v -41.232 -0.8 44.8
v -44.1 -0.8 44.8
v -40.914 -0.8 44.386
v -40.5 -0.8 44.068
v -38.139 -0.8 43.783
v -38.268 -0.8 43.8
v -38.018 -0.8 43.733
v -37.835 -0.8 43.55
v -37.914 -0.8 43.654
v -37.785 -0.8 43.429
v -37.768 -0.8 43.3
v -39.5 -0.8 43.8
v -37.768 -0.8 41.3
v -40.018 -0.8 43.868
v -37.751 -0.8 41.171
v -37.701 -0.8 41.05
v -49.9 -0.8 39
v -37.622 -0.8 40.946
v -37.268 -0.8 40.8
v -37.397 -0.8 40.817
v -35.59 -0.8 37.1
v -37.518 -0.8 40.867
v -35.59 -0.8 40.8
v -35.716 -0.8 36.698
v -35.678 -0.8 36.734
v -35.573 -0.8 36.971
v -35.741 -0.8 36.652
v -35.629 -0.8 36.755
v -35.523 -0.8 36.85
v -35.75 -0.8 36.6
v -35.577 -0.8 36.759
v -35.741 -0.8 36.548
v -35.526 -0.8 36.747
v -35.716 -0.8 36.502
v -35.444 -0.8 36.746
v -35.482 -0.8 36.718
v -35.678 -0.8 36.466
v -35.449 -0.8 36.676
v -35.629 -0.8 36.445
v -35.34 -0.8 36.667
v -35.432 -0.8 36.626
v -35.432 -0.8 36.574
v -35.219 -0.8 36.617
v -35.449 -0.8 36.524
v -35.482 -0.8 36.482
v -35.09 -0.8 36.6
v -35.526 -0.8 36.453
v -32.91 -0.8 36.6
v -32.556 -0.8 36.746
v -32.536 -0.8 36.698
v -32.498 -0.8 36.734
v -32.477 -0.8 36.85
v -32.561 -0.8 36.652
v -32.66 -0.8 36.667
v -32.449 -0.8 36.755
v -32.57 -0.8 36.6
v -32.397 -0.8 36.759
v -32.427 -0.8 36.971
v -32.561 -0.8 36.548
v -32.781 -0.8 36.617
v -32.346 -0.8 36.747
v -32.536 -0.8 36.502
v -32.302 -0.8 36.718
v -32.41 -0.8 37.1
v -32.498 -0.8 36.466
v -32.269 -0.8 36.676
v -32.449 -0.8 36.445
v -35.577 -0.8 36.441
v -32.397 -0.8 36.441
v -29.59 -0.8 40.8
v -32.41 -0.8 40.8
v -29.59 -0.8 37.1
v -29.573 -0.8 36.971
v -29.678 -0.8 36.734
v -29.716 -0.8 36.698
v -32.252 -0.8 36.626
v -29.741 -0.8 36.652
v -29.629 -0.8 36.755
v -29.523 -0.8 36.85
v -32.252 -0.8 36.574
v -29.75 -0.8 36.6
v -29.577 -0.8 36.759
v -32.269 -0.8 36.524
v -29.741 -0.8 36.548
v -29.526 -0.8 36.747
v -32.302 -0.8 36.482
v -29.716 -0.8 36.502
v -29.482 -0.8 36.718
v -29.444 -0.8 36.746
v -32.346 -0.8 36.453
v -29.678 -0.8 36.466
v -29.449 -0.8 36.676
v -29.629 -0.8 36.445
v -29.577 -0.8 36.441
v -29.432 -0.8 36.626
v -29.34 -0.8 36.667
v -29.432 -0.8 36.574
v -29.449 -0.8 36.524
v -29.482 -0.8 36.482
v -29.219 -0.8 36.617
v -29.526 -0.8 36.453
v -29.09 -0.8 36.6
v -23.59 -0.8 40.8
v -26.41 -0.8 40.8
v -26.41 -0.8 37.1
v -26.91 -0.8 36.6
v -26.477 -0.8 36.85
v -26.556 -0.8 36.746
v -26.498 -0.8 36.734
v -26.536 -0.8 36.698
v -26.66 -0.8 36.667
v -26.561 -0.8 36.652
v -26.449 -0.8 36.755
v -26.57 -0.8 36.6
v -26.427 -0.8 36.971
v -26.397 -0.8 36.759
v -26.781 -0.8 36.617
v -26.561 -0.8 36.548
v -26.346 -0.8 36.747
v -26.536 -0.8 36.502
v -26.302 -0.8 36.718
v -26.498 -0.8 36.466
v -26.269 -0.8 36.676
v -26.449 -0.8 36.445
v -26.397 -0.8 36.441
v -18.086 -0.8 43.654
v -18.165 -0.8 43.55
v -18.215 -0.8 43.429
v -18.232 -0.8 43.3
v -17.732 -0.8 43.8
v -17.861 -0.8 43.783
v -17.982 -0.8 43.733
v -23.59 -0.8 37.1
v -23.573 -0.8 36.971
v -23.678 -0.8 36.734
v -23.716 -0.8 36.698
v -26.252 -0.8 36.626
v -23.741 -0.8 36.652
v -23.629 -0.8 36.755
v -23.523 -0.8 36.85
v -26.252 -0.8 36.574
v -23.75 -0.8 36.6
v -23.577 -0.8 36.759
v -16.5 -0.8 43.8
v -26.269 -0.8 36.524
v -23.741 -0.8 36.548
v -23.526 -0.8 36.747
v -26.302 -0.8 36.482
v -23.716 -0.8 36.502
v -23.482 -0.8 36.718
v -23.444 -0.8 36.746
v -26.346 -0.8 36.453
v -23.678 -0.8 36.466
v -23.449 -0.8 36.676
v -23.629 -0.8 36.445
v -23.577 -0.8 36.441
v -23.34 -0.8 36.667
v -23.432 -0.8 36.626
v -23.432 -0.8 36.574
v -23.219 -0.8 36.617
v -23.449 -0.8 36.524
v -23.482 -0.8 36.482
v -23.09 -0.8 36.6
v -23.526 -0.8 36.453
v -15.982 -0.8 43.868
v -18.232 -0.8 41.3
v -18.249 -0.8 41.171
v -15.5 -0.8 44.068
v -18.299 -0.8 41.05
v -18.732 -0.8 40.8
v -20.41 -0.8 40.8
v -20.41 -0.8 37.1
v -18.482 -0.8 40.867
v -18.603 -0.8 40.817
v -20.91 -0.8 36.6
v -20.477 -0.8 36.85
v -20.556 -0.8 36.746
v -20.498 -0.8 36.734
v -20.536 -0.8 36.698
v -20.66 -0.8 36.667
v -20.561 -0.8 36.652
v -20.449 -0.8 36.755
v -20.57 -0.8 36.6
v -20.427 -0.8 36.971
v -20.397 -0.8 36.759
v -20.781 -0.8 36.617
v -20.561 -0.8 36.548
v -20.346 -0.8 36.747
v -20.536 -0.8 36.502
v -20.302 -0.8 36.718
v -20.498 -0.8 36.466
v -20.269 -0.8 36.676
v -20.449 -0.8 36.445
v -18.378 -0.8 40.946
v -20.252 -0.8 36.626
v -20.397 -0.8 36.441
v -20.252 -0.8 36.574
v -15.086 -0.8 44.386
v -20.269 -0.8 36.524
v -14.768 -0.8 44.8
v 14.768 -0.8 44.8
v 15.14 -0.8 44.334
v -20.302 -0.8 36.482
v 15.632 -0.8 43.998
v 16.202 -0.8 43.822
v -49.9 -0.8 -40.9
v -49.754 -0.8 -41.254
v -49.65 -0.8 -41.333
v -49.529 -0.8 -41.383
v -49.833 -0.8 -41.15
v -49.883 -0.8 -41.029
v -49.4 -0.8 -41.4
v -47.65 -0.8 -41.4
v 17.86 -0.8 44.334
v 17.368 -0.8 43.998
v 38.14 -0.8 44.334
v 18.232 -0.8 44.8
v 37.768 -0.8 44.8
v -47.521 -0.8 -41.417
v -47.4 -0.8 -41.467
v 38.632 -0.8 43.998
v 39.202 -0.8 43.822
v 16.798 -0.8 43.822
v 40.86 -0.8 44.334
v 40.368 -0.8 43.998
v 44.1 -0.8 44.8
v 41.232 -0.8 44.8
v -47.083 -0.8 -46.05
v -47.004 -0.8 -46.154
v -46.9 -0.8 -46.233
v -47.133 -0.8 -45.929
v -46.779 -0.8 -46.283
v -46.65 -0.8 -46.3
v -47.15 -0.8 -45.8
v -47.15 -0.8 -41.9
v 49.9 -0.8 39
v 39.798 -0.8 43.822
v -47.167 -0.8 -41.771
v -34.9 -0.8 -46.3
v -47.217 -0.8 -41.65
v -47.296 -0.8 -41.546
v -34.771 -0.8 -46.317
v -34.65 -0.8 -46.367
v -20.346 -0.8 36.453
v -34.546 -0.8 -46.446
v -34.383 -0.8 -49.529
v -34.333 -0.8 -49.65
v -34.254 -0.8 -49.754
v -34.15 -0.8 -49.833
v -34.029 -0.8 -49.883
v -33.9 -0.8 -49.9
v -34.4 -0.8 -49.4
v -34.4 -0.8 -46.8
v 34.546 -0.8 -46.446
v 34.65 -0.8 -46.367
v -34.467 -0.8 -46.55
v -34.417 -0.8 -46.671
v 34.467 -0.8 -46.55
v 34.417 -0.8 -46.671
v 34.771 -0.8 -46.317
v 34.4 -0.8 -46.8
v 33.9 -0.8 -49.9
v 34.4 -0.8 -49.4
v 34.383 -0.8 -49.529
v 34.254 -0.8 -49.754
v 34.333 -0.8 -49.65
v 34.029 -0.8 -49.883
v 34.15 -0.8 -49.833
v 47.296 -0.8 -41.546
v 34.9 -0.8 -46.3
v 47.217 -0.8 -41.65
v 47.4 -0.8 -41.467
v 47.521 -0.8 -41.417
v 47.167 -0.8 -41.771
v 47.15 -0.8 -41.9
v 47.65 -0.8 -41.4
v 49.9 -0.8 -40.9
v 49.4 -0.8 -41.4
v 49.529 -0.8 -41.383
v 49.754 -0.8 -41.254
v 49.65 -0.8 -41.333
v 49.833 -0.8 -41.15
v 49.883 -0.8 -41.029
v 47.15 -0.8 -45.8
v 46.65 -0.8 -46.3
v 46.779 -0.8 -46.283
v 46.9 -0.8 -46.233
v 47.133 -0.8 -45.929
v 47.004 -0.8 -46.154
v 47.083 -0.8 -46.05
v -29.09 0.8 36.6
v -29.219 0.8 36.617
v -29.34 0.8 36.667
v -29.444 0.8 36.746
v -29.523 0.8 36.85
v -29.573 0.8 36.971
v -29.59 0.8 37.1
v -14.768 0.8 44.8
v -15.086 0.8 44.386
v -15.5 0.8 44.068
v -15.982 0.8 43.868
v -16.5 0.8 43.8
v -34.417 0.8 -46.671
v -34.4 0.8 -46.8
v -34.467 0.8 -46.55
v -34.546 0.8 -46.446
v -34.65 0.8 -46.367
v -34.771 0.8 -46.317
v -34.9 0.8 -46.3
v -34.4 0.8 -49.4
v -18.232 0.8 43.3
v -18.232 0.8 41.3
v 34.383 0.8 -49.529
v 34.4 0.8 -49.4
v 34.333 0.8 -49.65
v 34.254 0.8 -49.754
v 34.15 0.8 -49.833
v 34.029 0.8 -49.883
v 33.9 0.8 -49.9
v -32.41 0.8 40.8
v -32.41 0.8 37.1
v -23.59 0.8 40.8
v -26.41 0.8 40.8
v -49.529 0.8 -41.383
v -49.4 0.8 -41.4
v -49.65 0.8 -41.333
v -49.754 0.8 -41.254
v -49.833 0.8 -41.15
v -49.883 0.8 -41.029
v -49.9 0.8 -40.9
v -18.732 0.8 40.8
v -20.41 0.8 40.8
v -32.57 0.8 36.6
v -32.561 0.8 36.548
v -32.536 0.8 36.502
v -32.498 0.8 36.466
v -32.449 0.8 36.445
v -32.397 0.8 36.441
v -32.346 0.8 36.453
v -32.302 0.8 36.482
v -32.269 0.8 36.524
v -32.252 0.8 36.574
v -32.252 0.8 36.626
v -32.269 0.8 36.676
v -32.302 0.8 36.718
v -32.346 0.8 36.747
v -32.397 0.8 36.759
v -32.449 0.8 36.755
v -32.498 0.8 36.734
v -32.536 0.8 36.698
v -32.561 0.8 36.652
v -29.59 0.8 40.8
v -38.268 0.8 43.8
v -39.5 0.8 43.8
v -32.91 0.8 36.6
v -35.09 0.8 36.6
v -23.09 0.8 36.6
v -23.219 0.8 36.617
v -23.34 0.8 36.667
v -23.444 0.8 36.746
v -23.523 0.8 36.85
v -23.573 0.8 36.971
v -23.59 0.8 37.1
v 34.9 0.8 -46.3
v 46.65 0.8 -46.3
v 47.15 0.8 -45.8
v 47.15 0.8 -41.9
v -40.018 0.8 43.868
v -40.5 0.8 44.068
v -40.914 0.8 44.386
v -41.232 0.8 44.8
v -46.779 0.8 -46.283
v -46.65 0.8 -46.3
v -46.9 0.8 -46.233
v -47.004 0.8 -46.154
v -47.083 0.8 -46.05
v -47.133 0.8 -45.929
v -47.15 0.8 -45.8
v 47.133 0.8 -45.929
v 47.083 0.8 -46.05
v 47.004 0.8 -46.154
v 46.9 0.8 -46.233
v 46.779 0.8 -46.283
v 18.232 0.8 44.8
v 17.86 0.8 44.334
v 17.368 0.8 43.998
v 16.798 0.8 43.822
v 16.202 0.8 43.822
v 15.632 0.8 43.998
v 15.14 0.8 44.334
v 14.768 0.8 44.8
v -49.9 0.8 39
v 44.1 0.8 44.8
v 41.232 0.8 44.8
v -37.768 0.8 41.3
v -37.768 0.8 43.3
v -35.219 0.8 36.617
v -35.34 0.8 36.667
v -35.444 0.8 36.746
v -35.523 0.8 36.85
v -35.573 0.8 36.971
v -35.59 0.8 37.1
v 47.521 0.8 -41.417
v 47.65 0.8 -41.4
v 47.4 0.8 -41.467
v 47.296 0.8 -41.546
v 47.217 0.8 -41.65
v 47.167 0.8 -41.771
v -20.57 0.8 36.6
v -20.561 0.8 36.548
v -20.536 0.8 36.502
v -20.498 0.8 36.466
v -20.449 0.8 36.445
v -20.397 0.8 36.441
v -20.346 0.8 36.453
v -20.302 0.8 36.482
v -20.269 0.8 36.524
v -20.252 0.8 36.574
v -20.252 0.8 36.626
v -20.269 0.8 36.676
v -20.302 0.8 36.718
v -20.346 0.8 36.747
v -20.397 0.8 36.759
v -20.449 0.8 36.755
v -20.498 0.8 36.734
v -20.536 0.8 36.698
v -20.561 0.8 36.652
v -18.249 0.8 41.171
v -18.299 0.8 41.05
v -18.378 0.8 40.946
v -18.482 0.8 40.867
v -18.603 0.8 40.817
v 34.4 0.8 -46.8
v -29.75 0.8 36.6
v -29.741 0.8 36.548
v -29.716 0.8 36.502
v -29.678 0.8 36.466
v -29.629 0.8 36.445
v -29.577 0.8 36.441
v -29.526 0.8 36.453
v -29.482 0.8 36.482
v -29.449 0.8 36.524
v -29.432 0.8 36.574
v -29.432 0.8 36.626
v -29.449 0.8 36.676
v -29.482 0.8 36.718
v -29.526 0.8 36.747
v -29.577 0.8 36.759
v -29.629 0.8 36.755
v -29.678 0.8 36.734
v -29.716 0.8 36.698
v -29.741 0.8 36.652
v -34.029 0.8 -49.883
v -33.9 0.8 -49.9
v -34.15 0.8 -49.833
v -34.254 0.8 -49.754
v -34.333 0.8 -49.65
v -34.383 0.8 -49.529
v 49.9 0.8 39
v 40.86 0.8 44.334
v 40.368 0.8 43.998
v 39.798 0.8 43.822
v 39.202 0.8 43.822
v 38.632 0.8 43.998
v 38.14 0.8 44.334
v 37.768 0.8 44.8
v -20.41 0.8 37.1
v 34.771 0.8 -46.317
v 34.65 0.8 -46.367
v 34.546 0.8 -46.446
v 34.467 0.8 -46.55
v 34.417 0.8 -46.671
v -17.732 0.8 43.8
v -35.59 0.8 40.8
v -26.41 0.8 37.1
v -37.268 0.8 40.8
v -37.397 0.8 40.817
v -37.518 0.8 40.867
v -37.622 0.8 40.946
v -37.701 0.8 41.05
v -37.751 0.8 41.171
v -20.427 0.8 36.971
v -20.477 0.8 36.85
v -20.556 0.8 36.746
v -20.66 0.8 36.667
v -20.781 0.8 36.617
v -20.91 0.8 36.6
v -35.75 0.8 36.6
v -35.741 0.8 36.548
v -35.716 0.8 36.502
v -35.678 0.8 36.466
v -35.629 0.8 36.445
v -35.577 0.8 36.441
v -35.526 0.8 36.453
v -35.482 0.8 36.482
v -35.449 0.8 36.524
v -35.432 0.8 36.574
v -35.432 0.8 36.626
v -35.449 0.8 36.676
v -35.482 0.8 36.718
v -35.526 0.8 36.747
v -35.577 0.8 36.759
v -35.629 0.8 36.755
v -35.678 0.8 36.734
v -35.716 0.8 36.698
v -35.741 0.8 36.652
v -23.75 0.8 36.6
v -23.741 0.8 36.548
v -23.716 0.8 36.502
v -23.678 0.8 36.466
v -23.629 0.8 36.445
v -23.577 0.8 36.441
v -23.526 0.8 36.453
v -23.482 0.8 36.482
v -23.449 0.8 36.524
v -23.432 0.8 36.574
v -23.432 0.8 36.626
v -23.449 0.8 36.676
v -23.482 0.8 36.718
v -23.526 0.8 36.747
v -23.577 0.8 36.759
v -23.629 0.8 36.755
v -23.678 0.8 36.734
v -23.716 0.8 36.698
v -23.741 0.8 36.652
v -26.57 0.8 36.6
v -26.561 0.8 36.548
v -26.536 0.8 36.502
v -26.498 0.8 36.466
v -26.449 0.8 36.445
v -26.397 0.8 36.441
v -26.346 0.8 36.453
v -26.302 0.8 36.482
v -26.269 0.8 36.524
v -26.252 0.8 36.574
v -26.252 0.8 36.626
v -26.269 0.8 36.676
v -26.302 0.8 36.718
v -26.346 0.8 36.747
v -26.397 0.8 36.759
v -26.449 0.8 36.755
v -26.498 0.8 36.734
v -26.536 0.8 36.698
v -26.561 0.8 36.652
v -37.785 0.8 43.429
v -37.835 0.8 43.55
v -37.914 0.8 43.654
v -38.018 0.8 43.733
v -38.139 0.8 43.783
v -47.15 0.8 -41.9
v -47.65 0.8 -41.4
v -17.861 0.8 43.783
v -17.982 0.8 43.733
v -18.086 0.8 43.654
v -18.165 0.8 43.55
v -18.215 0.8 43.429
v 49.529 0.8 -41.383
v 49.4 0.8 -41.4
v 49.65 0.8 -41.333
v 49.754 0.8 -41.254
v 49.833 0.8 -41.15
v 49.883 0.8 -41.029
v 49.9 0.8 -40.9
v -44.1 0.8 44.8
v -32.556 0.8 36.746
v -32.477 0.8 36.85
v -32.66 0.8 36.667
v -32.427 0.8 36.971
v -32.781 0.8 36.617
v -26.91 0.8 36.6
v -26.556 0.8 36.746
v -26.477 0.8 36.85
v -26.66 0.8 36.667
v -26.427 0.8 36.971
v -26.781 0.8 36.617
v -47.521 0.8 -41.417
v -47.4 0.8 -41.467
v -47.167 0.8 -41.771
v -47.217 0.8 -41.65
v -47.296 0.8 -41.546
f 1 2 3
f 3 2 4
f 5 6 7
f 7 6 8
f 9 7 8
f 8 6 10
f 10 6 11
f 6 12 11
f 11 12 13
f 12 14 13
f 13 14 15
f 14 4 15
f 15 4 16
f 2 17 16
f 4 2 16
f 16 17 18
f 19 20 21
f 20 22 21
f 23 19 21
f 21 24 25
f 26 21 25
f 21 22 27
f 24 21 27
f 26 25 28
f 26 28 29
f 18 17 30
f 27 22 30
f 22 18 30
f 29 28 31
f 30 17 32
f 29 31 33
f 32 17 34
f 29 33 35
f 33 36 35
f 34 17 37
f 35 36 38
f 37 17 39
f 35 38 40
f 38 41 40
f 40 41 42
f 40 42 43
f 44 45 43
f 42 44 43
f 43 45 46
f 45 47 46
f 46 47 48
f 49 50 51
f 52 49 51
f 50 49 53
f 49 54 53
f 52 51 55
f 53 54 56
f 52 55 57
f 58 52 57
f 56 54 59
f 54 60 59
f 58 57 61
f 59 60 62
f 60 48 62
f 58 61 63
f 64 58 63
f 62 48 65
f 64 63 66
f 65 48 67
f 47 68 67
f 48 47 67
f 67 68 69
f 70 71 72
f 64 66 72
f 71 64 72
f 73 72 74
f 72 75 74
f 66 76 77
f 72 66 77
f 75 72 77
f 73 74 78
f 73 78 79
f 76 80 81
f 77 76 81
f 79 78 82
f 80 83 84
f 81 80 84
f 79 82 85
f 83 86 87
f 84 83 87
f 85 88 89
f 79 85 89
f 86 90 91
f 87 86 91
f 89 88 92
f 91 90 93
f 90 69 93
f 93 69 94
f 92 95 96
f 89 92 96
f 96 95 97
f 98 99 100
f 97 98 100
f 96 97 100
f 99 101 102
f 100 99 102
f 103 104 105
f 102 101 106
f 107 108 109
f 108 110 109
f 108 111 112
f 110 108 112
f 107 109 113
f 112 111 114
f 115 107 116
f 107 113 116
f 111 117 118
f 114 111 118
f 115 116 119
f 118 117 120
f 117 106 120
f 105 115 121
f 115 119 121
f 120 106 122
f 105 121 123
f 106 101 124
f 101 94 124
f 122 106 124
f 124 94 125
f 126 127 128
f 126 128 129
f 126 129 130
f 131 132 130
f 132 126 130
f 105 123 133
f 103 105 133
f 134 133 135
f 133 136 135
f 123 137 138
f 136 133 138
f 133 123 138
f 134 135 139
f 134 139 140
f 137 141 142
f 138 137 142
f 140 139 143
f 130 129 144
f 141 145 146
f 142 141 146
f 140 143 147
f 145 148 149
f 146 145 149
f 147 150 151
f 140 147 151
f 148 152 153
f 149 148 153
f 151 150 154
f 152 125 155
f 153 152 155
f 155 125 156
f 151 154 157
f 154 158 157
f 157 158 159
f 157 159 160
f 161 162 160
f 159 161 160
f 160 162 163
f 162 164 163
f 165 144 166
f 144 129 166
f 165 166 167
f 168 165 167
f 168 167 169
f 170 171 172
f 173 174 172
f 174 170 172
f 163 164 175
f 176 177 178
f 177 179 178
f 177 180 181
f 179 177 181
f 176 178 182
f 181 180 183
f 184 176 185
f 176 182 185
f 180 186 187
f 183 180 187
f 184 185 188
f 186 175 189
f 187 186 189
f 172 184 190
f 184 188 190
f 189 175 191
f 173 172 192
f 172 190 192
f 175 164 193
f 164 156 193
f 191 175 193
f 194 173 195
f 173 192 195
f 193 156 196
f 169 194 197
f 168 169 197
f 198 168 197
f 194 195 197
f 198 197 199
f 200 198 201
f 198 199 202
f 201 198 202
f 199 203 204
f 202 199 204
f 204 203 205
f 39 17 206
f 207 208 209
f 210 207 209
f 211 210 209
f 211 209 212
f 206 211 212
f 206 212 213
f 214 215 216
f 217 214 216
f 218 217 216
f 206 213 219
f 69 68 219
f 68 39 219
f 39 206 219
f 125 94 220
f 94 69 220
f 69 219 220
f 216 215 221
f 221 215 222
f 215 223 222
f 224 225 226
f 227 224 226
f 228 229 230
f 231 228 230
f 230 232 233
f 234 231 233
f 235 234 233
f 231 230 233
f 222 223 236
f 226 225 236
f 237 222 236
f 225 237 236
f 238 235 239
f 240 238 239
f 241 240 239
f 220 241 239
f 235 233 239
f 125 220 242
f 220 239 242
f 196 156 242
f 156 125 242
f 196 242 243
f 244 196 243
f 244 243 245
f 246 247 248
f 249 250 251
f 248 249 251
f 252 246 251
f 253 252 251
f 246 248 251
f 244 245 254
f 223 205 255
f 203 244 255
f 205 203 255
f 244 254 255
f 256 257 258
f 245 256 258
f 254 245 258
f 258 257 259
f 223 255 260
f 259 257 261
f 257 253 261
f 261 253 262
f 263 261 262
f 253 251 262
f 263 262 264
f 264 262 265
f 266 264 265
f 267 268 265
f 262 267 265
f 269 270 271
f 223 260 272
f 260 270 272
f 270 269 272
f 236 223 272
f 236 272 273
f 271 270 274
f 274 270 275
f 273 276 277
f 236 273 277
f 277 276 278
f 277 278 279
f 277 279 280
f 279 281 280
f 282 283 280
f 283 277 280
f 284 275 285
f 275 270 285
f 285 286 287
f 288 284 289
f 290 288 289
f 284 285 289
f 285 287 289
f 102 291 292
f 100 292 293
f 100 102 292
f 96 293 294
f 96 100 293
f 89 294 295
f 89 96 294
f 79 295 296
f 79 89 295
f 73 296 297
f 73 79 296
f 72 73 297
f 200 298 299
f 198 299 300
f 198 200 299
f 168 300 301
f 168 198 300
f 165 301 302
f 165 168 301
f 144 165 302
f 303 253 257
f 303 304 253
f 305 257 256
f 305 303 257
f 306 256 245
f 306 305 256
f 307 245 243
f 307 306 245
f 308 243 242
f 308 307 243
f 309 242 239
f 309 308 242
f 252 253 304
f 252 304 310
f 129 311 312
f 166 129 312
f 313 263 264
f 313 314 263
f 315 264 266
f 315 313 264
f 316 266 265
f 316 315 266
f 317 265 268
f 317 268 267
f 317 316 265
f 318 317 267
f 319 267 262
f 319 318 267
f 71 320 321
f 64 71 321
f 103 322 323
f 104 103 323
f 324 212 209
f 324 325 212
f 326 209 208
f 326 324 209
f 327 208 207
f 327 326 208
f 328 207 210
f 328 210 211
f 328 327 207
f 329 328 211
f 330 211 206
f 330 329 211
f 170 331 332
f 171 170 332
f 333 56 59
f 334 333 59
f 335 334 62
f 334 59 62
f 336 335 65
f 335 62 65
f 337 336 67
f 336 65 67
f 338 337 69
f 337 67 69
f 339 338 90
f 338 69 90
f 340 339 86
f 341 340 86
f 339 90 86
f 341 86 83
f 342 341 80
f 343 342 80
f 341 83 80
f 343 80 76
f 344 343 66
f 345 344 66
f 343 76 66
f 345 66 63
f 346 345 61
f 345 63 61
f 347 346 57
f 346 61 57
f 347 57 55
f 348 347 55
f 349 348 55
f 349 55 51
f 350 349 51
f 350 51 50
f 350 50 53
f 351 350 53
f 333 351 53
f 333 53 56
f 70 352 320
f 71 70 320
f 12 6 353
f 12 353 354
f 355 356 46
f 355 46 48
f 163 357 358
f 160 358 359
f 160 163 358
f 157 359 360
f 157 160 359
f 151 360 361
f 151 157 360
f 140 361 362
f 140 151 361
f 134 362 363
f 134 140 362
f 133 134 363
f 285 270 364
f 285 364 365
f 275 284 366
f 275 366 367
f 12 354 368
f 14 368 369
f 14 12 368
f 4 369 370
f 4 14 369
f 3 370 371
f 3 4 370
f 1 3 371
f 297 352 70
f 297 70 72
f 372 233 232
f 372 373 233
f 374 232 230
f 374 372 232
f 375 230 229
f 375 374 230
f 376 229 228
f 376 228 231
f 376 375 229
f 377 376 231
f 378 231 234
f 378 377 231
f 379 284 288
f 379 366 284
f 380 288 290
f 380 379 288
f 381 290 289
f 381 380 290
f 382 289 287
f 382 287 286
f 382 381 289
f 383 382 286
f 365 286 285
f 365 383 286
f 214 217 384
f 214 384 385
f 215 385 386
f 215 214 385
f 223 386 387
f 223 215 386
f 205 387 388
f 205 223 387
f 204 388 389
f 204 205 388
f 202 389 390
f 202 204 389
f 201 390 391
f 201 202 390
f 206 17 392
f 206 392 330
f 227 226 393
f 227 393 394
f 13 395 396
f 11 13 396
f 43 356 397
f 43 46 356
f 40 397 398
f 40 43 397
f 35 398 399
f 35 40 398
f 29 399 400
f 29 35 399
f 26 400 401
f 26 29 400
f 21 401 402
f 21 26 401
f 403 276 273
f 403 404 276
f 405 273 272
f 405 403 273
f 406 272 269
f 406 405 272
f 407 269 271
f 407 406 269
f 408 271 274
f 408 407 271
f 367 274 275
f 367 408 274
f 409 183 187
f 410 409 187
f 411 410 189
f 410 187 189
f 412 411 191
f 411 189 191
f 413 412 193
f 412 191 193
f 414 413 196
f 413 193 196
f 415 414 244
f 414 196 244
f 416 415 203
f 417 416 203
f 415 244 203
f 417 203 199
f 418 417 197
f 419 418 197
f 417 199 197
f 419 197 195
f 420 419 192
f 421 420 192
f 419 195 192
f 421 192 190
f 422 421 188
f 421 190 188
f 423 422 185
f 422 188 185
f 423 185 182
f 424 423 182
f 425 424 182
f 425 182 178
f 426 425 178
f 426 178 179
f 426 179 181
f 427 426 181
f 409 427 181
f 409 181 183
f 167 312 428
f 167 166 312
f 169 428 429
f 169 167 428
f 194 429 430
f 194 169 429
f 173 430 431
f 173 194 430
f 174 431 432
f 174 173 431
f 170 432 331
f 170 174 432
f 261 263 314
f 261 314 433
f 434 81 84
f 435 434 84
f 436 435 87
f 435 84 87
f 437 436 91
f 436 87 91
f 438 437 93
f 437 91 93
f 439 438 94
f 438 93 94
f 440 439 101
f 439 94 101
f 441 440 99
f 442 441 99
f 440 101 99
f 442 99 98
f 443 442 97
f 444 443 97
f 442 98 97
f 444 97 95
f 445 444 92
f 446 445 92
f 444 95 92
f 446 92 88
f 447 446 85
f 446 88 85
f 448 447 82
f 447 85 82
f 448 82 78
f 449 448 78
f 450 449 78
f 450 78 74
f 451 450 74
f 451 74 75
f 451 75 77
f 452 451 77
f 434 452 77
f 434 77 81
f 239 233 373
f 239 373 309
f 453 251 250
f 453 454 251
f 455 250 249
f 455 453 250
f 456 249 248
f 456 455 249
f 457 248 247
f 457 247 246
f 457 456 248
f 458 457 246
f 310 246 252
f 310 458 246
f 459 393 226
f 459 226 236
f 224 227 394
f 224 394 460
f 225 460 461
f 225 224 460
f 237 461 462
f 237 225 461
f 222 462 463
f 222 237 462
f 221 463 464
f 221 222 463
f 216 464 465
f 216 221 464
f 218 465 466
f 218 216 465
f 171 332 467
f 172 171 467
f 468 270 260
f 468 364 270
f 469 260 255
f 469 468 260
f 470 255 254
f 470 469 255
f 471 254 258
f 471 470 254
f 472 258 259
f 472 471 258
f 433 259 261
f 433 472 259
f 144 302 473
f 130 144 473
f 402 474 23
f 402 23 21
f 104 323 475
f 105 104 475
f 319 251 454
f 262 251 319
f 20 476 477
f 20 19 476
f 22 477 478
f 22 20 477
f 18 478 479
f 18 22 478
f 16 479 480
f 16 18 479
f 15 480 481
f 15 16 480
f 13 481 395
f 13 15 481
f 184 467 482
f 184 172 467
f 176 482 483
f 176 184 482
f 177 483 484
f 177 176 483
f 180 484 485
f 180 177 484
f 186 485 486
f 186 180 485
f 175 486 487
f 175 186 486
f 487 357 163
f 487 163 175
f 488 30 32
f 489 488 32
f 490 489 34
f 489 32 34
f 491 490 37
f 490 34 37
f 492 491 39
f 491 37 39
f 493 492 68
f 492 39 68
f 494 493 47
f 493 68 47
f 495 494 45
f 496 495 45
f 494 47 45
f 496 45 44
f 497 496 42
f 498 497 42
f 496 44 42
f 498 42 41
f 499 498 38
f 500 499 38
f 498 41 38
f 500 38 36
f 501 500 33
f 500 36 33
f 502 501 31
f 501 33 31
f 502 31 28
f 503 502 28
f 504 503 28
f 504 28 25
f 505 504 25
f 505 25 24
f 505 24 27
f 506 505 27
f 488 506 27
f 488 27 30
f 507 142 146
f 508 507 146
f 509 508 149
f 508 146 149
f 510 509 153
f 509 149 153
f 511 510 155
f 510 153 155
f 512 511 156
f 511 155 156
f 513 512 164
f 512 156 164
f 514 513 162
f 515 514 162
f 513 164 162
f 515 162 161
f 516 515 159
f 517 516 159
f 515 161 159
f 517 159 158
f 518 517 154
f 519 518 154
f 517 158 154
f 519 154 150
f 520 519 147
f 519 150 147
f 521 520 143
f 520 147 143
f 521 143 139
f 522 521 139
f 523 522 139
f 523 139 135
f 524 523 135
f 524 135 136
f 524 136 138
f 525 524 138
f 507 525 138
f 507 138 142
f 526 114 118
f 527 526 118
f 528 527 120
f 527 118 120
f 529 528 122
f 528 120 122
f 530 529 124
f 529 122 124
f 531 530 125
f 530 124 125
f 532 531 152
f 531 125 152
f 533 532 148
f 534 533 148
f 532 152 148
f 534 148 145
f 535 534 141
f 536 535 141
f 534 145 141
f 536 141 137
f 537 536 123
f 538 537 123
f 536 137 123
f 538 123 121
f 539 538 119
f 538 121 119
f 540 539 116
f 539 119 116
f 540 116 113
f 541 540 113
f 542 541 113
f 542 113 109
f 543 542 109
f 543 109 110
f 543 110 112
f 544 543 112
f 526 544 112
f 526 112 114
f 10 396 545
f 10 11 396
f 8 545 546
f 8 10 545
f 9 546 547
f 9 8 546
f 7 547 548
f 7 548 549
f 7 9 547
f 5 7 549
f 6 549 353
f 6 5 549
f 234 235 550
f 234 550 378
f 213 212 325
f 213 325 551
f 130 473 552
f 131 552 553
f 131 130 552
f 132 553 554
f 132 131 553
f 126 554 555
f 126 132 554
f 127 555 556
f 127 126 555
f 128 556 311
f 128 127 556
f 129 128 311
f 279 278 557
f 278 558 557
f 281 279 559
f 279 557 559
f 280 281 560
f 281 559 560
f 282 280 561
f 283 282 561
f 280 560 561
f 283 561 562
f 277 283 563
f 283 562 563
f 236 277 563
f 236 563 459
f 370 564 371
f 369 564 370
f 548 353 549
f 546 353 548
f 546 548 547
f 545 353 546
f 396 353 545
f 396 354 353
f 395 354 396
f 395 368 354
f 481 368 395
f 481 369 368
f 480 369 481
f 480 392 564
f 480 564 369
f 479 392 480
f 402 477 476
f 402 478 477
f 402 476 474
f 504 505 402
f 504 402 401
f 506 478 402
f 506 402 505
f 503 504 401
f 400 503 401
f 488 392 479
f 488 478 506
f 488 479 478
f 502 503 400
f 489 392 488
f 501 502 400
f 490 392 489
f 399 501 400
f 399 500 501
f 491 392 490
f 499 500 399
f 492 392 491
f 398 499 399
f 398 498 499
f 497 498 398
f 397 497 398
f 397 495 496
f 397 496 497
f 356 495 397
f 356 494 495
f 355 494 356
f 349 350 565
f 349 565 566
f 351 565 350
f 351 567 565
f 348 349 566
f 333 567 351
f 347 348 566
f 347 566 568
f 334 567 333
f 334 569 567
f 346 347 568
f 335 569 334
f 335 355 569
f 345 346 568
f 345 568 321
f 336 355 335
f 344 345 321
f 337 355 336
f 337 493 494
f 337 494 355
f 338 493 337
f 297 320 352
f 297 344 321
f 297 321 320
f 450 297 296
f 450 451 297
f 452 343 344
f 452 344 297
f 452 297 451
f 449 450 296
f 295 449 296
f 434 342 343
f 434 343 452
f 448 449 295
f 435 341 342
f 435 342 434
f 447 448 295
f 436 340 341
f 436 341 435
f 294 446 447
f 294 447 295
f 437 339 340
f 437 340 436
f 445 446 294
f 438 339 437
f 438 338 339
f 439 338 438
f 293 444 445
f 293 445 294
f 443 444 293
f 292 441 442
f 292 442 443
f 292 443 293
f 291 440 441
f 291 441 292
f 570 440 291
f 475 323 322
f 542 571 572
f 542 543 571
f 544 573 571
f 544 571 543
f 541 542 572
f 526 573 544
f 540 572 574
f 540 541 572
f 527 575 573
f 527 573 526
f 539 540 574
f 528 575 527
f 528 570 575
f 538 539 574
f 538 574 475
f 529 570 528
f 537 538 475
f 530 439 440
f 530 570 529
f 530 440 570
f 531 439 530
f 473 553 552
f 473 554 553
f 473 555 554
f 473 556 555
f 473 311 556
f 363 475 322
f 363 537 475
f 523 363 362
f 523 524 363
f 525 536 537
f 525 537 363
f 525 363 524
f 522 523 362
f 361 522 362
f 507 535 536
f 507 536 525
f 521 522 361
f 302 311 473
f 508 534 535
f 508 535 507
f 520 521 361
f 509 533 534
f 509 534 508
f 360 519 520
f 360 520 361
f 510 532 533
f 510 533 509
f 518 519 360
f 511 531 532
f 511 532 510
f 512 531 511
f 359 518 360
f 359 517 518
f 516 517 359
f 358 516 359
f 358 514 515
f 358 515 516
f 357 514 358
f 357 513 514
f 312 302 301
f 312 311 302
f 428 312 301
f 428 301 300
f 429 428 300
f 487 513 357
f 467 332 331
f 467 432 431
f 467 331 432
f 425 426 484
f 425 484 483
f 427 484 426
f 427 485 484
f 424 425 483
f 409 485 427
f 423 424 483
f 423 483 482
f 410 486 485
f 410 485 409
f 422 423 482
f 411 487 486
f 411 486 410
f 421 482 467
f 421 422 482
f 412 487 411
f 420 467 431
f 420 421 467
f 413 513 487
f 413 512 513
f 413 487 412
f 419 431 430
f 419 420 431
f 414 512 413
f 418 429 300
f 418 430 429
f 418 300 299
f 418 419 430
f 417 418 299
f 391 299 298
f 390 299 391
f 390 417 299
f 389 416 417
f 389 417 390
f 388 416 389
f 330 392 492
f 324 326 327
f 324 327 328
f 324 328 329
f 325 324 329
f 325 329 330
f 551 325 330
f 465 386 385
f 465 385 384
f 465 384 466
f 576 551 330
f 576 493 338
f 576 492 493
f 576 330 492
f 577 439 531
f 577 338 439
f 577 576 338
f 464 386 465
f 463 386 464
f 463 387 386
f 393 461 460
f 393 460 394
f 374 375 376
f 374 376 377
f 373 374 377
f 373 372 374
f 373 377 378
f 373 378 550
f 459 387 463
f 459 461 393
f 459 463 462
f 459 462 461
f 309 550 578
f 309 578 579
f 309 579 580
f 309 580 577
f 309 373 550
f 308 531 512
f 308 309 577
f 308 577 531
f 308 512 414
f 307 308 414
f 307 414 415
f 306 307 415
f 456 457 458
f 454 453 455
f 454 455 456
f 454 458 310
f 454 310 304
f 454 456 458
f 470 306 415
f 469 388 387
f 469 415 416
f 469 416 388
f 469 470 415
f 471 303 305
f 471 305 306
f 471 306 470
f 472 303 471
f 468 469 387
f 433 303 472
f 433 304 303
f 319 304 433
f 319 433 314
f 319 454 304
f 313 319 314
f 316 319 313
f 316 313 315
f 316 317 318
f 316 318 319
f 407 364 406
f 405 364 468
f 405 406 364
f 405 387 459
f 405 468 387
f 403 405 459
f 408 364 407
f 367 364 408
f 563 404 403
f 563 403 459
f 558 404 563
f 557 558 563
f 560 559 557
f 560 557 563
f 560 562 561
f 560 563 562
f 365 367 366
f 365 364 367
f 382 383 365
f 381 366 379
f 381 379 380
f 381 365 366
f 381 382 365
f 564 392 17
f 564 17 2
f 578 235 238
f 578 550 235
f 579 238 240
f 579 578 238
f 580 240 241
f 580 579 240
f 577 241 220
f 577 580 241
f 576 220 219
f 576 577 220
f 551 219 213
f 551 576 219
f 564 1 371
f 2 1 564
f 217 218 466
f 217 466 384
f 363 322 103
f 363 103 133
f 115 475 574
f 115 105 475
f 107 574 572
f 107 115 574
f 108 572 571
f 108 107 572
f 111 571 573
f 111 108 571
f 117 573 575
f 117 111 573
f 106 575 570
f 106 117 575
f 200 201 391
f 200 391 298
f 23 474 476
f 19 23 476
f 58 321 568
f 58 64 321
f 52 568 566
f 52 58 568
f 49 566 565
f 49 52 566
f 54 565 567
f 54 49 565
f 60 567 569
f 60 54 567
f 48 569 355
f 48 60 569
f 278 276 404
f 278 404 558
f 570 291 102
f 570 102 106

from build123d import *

# Parameters (mm, degrees)
GENERALSHAPE_DEPTH           = 0.8
ADDTOLERANCE_START           = -0.8
ADDTOLERANCE_DEPTH           = 1.6
BACKPLANE_DEPTH              = 71.573791169
BACKPLANE_DEPTH_BACK         = 71.573791169
RF_W                         = 3.18
RF_H                         = 4.2
CUT_EXTRUDE1_DEPTH           = 71.587392642
FILLET1_R                    = 0.5
F_0_32_0_32_DIAMETER_HOLE1_D = 0.32
FILLET2_R                    = 0.5
FILLET3_R                    = 0.5


# Read off the part's stored shape, not the designer's step: AddTolerance
with BuildPart() as part:
    # Sketch2 → GeneralShape (new, symmetric)
    with BuildSketch(Plane(origin=(0, 0, 0), x_dir=(1, 0, 0), z_dir=(0, 1, 0))):
        Polygon((47.25, 46.4), (34.5, 46.4), (34.5, 50), (-34.5, 50), (-34.5, 46.4), (-47.25, 46.4), (-47.25, 41.5), (-50, 41.5), (-50, -38.9), (-41.5, -47.4), (41.5, -47.4), (50, -38.9), (50, 41.5), (47.25, 41.5), align=None)
    extrude(amount=GENERALSHAPE_DEPTH, both=True)

    # AddTolerance outline → AddTolerance (cut)
    with BuildSketch(Plane(origin=(0, 0, 0), x_dir=(1, 0, 0), z_dir=(0, 1, 0)).offset(ADDTOLERANCE_START)):
        Polygon((49.9, 41.4), (49.9, -39), (50, -38.9), (50, 41.5), (47.25, 41.5), (47.25, 46.4), (34.5, 46.4), (34.5, 50), (-34.5, 50), (-34.5, 46.4), (-47.25, 46.4), (-47.25, 41.5), (-50, 41.5), (-50, -38.9), (-49.9, -39), (-49.9, 41.4), (-47.15, 41.4), (-47.15, 46.3), (-34.4, 46.3), (-34.4, 49.9), (34.4, 49.9), (34.4, 46.3), (47.15, 46.3), (47.15, 41.4), align=None)
    extrude(amount=ADDTOLERANCE_DEPTH, mode=Mode.SUBTRACT)

    # Sketch4 → Backplane (cut, two sides: drawn at the far end of the back side and taken through both)
    with BuildSketch(Plane(origin=(0, 0, 0), x_dir=(1, 0, 0), z_dir=(0, 1, 0)).offset(-BACKPLANE_DEPTH_BACK)):
        with BuildLine():
            Line((41.5, -47.4), (44.1, -44.8))
            Line((44.1, -44.8), (41.232050808, -44.8))
            ThreePointArc((41.232050808, -44.8), (39.5, -43.8), (37.767949192, -44.8))
            Line((37.767949192, -44.8), (18.232050808, -44.8))
            ThreePointArc((18.232050808, -44.8), (16.5, -43.8), (14.767949192, -44.8))
            Line((14.767949192, -44.8), (-14.767949192, -44.8))
            ThreePointArc((-14.767949192, -44.8), (-16.5, -43.8), (-18.232050808, -44.8))
            Line((-18.232050808, -44.8), (-37.767949192, -44.8))
            ThreePointArc((-37.767949192, -44.8), (-39.5, -43.8), (-41.232050808, -44.8))
            Line((-41.232050808, -44.8), (-44.1, -44.8))
            Line((-44.1, -44.8), (-41.5, -47.4))
            Line((-41.5, -47.4), (41.5, -47.4))
        make_face()
    extrude(amount=BACKPLANE_DEPTH + BACKPLANE_DEPTH_BACK, mode=Mode.SUBTRACT)

    # RF → Cut-Extrude1 (cut, through all)
    with BuildSketch(Plane(origin=(0, 0.8, 0), x_dir=(1, 0, 0), z_dir=(0, 1, 0))):
        with Locations((-22, -38.7)):
            Rectangle(RF_W, RF_H)
        with Locations((-28, -38.7)):
            Rectangle(RF_W, RF_H)
        with Locations((-34, -38.7)):
            Rectangle(RF_W, RF_H)
        with BuildLine():
            Line((-18.232050808, -40.8), (-20.41, -40.8))
            Line((-20.41, -40.8), (-23.59, -40.8))
            Line((-23.59, -40.8), (-26.41, -40.8))
            Line((-26.41, -40.8), (-29.59, -40.8))
            Line((-29.59, -40.8), (-32.41, -40.8))
            Line((-32.41, -40.8), (-35.59, -40.8))
            Line((-35.59, -40.8), (-37.767949192, -40.8))
            Line((-37.767949192, -40.8), (-37.767949192, -43.8))
            Line((-37.767949192, -43.8), (-39.5, -43.8))
            ThreePointArc((-39.5, -43.8), (-38.5, -44.067949192), (-37.767949192, -44.8))
            Line((-37.767949192, -44.8), (-18.232050808, -44.8))
            ThreePointArc((-18.232050808, -44.8), (-17.5, -44.067949192), (-16.5, -43.8))
            Line((-16.5, -43.8), (-18.232050808, -43.8))
            Line((-18.232050808, -43.8), (-18.232050808, -40.8))
        make_face()
    extrude(amount=-CUT_EXTRUDE1_DEPTH, mode=Mode.SUBTRACT)

    # Fillet1
    fillet1_edges = [part.edges().sort_by_distance(p)[0] for p in [
        (-23.59, 0, 36.6),
        (-20.41, 0, 36.6),
        (-18.232050808, 0, 40.8),
        (-18.232050808, 0, 43.8),
        (-37.767949192, 0, 43.8),
        (-37.767949192, 0, 40.8),
        (-35.59, 0, 36.6),
        (-32.41, 0, 36.6),
        (-29.59, 0, 36.6),
        (-26.41, 0, 36.6),
    ]]
    fillet(fillet1_edges, radius=FILLET1_R)

    # Ø0.32 (0.32) Diameter Hole1 (through all)
    with Locations(Plane(origin=(0, 0.8, 0), x_dir=(1, 0, 0), z_dir=(0, 1, 0))):
        with Locations((-20.41, -36.6), (-23.59, -36.6), (-26.41, -36.6), (-29.59, -36.6), (-32.41, -36.6), (-35.59, -36.6)):
            Hole(F_0_32_0_32_DIAMETER_HOLE1_D / 2)

    # Fillet2
    fillet2_edges = [part.edges().sort_by_distance(p)[0] for p in [
        (47.15, 0, -41.4),
        (47.15, 0, -46.3),
        (34.4, 0, -46.3),
        (-34.4, 0, -46.3),
        (-47.15, 0, -46.3),
        (-47.15, 0, -41.4),
    ]]
    fillet(fillet2_edges, radius=FILLET2_R)

    # Fillet3
    fillet3_edges = [part.edges().sort_by_distance(p)[0] for p in [
        (49.9, 0, -41.4),
        (34.4, 0, -49.9),
        (-34.4, 0, -49.9),
        (-49.9, 0, -41.4),
    ]]
    fillet(fillet3_edges, radius=FILLET3_R)


solid = part.part
